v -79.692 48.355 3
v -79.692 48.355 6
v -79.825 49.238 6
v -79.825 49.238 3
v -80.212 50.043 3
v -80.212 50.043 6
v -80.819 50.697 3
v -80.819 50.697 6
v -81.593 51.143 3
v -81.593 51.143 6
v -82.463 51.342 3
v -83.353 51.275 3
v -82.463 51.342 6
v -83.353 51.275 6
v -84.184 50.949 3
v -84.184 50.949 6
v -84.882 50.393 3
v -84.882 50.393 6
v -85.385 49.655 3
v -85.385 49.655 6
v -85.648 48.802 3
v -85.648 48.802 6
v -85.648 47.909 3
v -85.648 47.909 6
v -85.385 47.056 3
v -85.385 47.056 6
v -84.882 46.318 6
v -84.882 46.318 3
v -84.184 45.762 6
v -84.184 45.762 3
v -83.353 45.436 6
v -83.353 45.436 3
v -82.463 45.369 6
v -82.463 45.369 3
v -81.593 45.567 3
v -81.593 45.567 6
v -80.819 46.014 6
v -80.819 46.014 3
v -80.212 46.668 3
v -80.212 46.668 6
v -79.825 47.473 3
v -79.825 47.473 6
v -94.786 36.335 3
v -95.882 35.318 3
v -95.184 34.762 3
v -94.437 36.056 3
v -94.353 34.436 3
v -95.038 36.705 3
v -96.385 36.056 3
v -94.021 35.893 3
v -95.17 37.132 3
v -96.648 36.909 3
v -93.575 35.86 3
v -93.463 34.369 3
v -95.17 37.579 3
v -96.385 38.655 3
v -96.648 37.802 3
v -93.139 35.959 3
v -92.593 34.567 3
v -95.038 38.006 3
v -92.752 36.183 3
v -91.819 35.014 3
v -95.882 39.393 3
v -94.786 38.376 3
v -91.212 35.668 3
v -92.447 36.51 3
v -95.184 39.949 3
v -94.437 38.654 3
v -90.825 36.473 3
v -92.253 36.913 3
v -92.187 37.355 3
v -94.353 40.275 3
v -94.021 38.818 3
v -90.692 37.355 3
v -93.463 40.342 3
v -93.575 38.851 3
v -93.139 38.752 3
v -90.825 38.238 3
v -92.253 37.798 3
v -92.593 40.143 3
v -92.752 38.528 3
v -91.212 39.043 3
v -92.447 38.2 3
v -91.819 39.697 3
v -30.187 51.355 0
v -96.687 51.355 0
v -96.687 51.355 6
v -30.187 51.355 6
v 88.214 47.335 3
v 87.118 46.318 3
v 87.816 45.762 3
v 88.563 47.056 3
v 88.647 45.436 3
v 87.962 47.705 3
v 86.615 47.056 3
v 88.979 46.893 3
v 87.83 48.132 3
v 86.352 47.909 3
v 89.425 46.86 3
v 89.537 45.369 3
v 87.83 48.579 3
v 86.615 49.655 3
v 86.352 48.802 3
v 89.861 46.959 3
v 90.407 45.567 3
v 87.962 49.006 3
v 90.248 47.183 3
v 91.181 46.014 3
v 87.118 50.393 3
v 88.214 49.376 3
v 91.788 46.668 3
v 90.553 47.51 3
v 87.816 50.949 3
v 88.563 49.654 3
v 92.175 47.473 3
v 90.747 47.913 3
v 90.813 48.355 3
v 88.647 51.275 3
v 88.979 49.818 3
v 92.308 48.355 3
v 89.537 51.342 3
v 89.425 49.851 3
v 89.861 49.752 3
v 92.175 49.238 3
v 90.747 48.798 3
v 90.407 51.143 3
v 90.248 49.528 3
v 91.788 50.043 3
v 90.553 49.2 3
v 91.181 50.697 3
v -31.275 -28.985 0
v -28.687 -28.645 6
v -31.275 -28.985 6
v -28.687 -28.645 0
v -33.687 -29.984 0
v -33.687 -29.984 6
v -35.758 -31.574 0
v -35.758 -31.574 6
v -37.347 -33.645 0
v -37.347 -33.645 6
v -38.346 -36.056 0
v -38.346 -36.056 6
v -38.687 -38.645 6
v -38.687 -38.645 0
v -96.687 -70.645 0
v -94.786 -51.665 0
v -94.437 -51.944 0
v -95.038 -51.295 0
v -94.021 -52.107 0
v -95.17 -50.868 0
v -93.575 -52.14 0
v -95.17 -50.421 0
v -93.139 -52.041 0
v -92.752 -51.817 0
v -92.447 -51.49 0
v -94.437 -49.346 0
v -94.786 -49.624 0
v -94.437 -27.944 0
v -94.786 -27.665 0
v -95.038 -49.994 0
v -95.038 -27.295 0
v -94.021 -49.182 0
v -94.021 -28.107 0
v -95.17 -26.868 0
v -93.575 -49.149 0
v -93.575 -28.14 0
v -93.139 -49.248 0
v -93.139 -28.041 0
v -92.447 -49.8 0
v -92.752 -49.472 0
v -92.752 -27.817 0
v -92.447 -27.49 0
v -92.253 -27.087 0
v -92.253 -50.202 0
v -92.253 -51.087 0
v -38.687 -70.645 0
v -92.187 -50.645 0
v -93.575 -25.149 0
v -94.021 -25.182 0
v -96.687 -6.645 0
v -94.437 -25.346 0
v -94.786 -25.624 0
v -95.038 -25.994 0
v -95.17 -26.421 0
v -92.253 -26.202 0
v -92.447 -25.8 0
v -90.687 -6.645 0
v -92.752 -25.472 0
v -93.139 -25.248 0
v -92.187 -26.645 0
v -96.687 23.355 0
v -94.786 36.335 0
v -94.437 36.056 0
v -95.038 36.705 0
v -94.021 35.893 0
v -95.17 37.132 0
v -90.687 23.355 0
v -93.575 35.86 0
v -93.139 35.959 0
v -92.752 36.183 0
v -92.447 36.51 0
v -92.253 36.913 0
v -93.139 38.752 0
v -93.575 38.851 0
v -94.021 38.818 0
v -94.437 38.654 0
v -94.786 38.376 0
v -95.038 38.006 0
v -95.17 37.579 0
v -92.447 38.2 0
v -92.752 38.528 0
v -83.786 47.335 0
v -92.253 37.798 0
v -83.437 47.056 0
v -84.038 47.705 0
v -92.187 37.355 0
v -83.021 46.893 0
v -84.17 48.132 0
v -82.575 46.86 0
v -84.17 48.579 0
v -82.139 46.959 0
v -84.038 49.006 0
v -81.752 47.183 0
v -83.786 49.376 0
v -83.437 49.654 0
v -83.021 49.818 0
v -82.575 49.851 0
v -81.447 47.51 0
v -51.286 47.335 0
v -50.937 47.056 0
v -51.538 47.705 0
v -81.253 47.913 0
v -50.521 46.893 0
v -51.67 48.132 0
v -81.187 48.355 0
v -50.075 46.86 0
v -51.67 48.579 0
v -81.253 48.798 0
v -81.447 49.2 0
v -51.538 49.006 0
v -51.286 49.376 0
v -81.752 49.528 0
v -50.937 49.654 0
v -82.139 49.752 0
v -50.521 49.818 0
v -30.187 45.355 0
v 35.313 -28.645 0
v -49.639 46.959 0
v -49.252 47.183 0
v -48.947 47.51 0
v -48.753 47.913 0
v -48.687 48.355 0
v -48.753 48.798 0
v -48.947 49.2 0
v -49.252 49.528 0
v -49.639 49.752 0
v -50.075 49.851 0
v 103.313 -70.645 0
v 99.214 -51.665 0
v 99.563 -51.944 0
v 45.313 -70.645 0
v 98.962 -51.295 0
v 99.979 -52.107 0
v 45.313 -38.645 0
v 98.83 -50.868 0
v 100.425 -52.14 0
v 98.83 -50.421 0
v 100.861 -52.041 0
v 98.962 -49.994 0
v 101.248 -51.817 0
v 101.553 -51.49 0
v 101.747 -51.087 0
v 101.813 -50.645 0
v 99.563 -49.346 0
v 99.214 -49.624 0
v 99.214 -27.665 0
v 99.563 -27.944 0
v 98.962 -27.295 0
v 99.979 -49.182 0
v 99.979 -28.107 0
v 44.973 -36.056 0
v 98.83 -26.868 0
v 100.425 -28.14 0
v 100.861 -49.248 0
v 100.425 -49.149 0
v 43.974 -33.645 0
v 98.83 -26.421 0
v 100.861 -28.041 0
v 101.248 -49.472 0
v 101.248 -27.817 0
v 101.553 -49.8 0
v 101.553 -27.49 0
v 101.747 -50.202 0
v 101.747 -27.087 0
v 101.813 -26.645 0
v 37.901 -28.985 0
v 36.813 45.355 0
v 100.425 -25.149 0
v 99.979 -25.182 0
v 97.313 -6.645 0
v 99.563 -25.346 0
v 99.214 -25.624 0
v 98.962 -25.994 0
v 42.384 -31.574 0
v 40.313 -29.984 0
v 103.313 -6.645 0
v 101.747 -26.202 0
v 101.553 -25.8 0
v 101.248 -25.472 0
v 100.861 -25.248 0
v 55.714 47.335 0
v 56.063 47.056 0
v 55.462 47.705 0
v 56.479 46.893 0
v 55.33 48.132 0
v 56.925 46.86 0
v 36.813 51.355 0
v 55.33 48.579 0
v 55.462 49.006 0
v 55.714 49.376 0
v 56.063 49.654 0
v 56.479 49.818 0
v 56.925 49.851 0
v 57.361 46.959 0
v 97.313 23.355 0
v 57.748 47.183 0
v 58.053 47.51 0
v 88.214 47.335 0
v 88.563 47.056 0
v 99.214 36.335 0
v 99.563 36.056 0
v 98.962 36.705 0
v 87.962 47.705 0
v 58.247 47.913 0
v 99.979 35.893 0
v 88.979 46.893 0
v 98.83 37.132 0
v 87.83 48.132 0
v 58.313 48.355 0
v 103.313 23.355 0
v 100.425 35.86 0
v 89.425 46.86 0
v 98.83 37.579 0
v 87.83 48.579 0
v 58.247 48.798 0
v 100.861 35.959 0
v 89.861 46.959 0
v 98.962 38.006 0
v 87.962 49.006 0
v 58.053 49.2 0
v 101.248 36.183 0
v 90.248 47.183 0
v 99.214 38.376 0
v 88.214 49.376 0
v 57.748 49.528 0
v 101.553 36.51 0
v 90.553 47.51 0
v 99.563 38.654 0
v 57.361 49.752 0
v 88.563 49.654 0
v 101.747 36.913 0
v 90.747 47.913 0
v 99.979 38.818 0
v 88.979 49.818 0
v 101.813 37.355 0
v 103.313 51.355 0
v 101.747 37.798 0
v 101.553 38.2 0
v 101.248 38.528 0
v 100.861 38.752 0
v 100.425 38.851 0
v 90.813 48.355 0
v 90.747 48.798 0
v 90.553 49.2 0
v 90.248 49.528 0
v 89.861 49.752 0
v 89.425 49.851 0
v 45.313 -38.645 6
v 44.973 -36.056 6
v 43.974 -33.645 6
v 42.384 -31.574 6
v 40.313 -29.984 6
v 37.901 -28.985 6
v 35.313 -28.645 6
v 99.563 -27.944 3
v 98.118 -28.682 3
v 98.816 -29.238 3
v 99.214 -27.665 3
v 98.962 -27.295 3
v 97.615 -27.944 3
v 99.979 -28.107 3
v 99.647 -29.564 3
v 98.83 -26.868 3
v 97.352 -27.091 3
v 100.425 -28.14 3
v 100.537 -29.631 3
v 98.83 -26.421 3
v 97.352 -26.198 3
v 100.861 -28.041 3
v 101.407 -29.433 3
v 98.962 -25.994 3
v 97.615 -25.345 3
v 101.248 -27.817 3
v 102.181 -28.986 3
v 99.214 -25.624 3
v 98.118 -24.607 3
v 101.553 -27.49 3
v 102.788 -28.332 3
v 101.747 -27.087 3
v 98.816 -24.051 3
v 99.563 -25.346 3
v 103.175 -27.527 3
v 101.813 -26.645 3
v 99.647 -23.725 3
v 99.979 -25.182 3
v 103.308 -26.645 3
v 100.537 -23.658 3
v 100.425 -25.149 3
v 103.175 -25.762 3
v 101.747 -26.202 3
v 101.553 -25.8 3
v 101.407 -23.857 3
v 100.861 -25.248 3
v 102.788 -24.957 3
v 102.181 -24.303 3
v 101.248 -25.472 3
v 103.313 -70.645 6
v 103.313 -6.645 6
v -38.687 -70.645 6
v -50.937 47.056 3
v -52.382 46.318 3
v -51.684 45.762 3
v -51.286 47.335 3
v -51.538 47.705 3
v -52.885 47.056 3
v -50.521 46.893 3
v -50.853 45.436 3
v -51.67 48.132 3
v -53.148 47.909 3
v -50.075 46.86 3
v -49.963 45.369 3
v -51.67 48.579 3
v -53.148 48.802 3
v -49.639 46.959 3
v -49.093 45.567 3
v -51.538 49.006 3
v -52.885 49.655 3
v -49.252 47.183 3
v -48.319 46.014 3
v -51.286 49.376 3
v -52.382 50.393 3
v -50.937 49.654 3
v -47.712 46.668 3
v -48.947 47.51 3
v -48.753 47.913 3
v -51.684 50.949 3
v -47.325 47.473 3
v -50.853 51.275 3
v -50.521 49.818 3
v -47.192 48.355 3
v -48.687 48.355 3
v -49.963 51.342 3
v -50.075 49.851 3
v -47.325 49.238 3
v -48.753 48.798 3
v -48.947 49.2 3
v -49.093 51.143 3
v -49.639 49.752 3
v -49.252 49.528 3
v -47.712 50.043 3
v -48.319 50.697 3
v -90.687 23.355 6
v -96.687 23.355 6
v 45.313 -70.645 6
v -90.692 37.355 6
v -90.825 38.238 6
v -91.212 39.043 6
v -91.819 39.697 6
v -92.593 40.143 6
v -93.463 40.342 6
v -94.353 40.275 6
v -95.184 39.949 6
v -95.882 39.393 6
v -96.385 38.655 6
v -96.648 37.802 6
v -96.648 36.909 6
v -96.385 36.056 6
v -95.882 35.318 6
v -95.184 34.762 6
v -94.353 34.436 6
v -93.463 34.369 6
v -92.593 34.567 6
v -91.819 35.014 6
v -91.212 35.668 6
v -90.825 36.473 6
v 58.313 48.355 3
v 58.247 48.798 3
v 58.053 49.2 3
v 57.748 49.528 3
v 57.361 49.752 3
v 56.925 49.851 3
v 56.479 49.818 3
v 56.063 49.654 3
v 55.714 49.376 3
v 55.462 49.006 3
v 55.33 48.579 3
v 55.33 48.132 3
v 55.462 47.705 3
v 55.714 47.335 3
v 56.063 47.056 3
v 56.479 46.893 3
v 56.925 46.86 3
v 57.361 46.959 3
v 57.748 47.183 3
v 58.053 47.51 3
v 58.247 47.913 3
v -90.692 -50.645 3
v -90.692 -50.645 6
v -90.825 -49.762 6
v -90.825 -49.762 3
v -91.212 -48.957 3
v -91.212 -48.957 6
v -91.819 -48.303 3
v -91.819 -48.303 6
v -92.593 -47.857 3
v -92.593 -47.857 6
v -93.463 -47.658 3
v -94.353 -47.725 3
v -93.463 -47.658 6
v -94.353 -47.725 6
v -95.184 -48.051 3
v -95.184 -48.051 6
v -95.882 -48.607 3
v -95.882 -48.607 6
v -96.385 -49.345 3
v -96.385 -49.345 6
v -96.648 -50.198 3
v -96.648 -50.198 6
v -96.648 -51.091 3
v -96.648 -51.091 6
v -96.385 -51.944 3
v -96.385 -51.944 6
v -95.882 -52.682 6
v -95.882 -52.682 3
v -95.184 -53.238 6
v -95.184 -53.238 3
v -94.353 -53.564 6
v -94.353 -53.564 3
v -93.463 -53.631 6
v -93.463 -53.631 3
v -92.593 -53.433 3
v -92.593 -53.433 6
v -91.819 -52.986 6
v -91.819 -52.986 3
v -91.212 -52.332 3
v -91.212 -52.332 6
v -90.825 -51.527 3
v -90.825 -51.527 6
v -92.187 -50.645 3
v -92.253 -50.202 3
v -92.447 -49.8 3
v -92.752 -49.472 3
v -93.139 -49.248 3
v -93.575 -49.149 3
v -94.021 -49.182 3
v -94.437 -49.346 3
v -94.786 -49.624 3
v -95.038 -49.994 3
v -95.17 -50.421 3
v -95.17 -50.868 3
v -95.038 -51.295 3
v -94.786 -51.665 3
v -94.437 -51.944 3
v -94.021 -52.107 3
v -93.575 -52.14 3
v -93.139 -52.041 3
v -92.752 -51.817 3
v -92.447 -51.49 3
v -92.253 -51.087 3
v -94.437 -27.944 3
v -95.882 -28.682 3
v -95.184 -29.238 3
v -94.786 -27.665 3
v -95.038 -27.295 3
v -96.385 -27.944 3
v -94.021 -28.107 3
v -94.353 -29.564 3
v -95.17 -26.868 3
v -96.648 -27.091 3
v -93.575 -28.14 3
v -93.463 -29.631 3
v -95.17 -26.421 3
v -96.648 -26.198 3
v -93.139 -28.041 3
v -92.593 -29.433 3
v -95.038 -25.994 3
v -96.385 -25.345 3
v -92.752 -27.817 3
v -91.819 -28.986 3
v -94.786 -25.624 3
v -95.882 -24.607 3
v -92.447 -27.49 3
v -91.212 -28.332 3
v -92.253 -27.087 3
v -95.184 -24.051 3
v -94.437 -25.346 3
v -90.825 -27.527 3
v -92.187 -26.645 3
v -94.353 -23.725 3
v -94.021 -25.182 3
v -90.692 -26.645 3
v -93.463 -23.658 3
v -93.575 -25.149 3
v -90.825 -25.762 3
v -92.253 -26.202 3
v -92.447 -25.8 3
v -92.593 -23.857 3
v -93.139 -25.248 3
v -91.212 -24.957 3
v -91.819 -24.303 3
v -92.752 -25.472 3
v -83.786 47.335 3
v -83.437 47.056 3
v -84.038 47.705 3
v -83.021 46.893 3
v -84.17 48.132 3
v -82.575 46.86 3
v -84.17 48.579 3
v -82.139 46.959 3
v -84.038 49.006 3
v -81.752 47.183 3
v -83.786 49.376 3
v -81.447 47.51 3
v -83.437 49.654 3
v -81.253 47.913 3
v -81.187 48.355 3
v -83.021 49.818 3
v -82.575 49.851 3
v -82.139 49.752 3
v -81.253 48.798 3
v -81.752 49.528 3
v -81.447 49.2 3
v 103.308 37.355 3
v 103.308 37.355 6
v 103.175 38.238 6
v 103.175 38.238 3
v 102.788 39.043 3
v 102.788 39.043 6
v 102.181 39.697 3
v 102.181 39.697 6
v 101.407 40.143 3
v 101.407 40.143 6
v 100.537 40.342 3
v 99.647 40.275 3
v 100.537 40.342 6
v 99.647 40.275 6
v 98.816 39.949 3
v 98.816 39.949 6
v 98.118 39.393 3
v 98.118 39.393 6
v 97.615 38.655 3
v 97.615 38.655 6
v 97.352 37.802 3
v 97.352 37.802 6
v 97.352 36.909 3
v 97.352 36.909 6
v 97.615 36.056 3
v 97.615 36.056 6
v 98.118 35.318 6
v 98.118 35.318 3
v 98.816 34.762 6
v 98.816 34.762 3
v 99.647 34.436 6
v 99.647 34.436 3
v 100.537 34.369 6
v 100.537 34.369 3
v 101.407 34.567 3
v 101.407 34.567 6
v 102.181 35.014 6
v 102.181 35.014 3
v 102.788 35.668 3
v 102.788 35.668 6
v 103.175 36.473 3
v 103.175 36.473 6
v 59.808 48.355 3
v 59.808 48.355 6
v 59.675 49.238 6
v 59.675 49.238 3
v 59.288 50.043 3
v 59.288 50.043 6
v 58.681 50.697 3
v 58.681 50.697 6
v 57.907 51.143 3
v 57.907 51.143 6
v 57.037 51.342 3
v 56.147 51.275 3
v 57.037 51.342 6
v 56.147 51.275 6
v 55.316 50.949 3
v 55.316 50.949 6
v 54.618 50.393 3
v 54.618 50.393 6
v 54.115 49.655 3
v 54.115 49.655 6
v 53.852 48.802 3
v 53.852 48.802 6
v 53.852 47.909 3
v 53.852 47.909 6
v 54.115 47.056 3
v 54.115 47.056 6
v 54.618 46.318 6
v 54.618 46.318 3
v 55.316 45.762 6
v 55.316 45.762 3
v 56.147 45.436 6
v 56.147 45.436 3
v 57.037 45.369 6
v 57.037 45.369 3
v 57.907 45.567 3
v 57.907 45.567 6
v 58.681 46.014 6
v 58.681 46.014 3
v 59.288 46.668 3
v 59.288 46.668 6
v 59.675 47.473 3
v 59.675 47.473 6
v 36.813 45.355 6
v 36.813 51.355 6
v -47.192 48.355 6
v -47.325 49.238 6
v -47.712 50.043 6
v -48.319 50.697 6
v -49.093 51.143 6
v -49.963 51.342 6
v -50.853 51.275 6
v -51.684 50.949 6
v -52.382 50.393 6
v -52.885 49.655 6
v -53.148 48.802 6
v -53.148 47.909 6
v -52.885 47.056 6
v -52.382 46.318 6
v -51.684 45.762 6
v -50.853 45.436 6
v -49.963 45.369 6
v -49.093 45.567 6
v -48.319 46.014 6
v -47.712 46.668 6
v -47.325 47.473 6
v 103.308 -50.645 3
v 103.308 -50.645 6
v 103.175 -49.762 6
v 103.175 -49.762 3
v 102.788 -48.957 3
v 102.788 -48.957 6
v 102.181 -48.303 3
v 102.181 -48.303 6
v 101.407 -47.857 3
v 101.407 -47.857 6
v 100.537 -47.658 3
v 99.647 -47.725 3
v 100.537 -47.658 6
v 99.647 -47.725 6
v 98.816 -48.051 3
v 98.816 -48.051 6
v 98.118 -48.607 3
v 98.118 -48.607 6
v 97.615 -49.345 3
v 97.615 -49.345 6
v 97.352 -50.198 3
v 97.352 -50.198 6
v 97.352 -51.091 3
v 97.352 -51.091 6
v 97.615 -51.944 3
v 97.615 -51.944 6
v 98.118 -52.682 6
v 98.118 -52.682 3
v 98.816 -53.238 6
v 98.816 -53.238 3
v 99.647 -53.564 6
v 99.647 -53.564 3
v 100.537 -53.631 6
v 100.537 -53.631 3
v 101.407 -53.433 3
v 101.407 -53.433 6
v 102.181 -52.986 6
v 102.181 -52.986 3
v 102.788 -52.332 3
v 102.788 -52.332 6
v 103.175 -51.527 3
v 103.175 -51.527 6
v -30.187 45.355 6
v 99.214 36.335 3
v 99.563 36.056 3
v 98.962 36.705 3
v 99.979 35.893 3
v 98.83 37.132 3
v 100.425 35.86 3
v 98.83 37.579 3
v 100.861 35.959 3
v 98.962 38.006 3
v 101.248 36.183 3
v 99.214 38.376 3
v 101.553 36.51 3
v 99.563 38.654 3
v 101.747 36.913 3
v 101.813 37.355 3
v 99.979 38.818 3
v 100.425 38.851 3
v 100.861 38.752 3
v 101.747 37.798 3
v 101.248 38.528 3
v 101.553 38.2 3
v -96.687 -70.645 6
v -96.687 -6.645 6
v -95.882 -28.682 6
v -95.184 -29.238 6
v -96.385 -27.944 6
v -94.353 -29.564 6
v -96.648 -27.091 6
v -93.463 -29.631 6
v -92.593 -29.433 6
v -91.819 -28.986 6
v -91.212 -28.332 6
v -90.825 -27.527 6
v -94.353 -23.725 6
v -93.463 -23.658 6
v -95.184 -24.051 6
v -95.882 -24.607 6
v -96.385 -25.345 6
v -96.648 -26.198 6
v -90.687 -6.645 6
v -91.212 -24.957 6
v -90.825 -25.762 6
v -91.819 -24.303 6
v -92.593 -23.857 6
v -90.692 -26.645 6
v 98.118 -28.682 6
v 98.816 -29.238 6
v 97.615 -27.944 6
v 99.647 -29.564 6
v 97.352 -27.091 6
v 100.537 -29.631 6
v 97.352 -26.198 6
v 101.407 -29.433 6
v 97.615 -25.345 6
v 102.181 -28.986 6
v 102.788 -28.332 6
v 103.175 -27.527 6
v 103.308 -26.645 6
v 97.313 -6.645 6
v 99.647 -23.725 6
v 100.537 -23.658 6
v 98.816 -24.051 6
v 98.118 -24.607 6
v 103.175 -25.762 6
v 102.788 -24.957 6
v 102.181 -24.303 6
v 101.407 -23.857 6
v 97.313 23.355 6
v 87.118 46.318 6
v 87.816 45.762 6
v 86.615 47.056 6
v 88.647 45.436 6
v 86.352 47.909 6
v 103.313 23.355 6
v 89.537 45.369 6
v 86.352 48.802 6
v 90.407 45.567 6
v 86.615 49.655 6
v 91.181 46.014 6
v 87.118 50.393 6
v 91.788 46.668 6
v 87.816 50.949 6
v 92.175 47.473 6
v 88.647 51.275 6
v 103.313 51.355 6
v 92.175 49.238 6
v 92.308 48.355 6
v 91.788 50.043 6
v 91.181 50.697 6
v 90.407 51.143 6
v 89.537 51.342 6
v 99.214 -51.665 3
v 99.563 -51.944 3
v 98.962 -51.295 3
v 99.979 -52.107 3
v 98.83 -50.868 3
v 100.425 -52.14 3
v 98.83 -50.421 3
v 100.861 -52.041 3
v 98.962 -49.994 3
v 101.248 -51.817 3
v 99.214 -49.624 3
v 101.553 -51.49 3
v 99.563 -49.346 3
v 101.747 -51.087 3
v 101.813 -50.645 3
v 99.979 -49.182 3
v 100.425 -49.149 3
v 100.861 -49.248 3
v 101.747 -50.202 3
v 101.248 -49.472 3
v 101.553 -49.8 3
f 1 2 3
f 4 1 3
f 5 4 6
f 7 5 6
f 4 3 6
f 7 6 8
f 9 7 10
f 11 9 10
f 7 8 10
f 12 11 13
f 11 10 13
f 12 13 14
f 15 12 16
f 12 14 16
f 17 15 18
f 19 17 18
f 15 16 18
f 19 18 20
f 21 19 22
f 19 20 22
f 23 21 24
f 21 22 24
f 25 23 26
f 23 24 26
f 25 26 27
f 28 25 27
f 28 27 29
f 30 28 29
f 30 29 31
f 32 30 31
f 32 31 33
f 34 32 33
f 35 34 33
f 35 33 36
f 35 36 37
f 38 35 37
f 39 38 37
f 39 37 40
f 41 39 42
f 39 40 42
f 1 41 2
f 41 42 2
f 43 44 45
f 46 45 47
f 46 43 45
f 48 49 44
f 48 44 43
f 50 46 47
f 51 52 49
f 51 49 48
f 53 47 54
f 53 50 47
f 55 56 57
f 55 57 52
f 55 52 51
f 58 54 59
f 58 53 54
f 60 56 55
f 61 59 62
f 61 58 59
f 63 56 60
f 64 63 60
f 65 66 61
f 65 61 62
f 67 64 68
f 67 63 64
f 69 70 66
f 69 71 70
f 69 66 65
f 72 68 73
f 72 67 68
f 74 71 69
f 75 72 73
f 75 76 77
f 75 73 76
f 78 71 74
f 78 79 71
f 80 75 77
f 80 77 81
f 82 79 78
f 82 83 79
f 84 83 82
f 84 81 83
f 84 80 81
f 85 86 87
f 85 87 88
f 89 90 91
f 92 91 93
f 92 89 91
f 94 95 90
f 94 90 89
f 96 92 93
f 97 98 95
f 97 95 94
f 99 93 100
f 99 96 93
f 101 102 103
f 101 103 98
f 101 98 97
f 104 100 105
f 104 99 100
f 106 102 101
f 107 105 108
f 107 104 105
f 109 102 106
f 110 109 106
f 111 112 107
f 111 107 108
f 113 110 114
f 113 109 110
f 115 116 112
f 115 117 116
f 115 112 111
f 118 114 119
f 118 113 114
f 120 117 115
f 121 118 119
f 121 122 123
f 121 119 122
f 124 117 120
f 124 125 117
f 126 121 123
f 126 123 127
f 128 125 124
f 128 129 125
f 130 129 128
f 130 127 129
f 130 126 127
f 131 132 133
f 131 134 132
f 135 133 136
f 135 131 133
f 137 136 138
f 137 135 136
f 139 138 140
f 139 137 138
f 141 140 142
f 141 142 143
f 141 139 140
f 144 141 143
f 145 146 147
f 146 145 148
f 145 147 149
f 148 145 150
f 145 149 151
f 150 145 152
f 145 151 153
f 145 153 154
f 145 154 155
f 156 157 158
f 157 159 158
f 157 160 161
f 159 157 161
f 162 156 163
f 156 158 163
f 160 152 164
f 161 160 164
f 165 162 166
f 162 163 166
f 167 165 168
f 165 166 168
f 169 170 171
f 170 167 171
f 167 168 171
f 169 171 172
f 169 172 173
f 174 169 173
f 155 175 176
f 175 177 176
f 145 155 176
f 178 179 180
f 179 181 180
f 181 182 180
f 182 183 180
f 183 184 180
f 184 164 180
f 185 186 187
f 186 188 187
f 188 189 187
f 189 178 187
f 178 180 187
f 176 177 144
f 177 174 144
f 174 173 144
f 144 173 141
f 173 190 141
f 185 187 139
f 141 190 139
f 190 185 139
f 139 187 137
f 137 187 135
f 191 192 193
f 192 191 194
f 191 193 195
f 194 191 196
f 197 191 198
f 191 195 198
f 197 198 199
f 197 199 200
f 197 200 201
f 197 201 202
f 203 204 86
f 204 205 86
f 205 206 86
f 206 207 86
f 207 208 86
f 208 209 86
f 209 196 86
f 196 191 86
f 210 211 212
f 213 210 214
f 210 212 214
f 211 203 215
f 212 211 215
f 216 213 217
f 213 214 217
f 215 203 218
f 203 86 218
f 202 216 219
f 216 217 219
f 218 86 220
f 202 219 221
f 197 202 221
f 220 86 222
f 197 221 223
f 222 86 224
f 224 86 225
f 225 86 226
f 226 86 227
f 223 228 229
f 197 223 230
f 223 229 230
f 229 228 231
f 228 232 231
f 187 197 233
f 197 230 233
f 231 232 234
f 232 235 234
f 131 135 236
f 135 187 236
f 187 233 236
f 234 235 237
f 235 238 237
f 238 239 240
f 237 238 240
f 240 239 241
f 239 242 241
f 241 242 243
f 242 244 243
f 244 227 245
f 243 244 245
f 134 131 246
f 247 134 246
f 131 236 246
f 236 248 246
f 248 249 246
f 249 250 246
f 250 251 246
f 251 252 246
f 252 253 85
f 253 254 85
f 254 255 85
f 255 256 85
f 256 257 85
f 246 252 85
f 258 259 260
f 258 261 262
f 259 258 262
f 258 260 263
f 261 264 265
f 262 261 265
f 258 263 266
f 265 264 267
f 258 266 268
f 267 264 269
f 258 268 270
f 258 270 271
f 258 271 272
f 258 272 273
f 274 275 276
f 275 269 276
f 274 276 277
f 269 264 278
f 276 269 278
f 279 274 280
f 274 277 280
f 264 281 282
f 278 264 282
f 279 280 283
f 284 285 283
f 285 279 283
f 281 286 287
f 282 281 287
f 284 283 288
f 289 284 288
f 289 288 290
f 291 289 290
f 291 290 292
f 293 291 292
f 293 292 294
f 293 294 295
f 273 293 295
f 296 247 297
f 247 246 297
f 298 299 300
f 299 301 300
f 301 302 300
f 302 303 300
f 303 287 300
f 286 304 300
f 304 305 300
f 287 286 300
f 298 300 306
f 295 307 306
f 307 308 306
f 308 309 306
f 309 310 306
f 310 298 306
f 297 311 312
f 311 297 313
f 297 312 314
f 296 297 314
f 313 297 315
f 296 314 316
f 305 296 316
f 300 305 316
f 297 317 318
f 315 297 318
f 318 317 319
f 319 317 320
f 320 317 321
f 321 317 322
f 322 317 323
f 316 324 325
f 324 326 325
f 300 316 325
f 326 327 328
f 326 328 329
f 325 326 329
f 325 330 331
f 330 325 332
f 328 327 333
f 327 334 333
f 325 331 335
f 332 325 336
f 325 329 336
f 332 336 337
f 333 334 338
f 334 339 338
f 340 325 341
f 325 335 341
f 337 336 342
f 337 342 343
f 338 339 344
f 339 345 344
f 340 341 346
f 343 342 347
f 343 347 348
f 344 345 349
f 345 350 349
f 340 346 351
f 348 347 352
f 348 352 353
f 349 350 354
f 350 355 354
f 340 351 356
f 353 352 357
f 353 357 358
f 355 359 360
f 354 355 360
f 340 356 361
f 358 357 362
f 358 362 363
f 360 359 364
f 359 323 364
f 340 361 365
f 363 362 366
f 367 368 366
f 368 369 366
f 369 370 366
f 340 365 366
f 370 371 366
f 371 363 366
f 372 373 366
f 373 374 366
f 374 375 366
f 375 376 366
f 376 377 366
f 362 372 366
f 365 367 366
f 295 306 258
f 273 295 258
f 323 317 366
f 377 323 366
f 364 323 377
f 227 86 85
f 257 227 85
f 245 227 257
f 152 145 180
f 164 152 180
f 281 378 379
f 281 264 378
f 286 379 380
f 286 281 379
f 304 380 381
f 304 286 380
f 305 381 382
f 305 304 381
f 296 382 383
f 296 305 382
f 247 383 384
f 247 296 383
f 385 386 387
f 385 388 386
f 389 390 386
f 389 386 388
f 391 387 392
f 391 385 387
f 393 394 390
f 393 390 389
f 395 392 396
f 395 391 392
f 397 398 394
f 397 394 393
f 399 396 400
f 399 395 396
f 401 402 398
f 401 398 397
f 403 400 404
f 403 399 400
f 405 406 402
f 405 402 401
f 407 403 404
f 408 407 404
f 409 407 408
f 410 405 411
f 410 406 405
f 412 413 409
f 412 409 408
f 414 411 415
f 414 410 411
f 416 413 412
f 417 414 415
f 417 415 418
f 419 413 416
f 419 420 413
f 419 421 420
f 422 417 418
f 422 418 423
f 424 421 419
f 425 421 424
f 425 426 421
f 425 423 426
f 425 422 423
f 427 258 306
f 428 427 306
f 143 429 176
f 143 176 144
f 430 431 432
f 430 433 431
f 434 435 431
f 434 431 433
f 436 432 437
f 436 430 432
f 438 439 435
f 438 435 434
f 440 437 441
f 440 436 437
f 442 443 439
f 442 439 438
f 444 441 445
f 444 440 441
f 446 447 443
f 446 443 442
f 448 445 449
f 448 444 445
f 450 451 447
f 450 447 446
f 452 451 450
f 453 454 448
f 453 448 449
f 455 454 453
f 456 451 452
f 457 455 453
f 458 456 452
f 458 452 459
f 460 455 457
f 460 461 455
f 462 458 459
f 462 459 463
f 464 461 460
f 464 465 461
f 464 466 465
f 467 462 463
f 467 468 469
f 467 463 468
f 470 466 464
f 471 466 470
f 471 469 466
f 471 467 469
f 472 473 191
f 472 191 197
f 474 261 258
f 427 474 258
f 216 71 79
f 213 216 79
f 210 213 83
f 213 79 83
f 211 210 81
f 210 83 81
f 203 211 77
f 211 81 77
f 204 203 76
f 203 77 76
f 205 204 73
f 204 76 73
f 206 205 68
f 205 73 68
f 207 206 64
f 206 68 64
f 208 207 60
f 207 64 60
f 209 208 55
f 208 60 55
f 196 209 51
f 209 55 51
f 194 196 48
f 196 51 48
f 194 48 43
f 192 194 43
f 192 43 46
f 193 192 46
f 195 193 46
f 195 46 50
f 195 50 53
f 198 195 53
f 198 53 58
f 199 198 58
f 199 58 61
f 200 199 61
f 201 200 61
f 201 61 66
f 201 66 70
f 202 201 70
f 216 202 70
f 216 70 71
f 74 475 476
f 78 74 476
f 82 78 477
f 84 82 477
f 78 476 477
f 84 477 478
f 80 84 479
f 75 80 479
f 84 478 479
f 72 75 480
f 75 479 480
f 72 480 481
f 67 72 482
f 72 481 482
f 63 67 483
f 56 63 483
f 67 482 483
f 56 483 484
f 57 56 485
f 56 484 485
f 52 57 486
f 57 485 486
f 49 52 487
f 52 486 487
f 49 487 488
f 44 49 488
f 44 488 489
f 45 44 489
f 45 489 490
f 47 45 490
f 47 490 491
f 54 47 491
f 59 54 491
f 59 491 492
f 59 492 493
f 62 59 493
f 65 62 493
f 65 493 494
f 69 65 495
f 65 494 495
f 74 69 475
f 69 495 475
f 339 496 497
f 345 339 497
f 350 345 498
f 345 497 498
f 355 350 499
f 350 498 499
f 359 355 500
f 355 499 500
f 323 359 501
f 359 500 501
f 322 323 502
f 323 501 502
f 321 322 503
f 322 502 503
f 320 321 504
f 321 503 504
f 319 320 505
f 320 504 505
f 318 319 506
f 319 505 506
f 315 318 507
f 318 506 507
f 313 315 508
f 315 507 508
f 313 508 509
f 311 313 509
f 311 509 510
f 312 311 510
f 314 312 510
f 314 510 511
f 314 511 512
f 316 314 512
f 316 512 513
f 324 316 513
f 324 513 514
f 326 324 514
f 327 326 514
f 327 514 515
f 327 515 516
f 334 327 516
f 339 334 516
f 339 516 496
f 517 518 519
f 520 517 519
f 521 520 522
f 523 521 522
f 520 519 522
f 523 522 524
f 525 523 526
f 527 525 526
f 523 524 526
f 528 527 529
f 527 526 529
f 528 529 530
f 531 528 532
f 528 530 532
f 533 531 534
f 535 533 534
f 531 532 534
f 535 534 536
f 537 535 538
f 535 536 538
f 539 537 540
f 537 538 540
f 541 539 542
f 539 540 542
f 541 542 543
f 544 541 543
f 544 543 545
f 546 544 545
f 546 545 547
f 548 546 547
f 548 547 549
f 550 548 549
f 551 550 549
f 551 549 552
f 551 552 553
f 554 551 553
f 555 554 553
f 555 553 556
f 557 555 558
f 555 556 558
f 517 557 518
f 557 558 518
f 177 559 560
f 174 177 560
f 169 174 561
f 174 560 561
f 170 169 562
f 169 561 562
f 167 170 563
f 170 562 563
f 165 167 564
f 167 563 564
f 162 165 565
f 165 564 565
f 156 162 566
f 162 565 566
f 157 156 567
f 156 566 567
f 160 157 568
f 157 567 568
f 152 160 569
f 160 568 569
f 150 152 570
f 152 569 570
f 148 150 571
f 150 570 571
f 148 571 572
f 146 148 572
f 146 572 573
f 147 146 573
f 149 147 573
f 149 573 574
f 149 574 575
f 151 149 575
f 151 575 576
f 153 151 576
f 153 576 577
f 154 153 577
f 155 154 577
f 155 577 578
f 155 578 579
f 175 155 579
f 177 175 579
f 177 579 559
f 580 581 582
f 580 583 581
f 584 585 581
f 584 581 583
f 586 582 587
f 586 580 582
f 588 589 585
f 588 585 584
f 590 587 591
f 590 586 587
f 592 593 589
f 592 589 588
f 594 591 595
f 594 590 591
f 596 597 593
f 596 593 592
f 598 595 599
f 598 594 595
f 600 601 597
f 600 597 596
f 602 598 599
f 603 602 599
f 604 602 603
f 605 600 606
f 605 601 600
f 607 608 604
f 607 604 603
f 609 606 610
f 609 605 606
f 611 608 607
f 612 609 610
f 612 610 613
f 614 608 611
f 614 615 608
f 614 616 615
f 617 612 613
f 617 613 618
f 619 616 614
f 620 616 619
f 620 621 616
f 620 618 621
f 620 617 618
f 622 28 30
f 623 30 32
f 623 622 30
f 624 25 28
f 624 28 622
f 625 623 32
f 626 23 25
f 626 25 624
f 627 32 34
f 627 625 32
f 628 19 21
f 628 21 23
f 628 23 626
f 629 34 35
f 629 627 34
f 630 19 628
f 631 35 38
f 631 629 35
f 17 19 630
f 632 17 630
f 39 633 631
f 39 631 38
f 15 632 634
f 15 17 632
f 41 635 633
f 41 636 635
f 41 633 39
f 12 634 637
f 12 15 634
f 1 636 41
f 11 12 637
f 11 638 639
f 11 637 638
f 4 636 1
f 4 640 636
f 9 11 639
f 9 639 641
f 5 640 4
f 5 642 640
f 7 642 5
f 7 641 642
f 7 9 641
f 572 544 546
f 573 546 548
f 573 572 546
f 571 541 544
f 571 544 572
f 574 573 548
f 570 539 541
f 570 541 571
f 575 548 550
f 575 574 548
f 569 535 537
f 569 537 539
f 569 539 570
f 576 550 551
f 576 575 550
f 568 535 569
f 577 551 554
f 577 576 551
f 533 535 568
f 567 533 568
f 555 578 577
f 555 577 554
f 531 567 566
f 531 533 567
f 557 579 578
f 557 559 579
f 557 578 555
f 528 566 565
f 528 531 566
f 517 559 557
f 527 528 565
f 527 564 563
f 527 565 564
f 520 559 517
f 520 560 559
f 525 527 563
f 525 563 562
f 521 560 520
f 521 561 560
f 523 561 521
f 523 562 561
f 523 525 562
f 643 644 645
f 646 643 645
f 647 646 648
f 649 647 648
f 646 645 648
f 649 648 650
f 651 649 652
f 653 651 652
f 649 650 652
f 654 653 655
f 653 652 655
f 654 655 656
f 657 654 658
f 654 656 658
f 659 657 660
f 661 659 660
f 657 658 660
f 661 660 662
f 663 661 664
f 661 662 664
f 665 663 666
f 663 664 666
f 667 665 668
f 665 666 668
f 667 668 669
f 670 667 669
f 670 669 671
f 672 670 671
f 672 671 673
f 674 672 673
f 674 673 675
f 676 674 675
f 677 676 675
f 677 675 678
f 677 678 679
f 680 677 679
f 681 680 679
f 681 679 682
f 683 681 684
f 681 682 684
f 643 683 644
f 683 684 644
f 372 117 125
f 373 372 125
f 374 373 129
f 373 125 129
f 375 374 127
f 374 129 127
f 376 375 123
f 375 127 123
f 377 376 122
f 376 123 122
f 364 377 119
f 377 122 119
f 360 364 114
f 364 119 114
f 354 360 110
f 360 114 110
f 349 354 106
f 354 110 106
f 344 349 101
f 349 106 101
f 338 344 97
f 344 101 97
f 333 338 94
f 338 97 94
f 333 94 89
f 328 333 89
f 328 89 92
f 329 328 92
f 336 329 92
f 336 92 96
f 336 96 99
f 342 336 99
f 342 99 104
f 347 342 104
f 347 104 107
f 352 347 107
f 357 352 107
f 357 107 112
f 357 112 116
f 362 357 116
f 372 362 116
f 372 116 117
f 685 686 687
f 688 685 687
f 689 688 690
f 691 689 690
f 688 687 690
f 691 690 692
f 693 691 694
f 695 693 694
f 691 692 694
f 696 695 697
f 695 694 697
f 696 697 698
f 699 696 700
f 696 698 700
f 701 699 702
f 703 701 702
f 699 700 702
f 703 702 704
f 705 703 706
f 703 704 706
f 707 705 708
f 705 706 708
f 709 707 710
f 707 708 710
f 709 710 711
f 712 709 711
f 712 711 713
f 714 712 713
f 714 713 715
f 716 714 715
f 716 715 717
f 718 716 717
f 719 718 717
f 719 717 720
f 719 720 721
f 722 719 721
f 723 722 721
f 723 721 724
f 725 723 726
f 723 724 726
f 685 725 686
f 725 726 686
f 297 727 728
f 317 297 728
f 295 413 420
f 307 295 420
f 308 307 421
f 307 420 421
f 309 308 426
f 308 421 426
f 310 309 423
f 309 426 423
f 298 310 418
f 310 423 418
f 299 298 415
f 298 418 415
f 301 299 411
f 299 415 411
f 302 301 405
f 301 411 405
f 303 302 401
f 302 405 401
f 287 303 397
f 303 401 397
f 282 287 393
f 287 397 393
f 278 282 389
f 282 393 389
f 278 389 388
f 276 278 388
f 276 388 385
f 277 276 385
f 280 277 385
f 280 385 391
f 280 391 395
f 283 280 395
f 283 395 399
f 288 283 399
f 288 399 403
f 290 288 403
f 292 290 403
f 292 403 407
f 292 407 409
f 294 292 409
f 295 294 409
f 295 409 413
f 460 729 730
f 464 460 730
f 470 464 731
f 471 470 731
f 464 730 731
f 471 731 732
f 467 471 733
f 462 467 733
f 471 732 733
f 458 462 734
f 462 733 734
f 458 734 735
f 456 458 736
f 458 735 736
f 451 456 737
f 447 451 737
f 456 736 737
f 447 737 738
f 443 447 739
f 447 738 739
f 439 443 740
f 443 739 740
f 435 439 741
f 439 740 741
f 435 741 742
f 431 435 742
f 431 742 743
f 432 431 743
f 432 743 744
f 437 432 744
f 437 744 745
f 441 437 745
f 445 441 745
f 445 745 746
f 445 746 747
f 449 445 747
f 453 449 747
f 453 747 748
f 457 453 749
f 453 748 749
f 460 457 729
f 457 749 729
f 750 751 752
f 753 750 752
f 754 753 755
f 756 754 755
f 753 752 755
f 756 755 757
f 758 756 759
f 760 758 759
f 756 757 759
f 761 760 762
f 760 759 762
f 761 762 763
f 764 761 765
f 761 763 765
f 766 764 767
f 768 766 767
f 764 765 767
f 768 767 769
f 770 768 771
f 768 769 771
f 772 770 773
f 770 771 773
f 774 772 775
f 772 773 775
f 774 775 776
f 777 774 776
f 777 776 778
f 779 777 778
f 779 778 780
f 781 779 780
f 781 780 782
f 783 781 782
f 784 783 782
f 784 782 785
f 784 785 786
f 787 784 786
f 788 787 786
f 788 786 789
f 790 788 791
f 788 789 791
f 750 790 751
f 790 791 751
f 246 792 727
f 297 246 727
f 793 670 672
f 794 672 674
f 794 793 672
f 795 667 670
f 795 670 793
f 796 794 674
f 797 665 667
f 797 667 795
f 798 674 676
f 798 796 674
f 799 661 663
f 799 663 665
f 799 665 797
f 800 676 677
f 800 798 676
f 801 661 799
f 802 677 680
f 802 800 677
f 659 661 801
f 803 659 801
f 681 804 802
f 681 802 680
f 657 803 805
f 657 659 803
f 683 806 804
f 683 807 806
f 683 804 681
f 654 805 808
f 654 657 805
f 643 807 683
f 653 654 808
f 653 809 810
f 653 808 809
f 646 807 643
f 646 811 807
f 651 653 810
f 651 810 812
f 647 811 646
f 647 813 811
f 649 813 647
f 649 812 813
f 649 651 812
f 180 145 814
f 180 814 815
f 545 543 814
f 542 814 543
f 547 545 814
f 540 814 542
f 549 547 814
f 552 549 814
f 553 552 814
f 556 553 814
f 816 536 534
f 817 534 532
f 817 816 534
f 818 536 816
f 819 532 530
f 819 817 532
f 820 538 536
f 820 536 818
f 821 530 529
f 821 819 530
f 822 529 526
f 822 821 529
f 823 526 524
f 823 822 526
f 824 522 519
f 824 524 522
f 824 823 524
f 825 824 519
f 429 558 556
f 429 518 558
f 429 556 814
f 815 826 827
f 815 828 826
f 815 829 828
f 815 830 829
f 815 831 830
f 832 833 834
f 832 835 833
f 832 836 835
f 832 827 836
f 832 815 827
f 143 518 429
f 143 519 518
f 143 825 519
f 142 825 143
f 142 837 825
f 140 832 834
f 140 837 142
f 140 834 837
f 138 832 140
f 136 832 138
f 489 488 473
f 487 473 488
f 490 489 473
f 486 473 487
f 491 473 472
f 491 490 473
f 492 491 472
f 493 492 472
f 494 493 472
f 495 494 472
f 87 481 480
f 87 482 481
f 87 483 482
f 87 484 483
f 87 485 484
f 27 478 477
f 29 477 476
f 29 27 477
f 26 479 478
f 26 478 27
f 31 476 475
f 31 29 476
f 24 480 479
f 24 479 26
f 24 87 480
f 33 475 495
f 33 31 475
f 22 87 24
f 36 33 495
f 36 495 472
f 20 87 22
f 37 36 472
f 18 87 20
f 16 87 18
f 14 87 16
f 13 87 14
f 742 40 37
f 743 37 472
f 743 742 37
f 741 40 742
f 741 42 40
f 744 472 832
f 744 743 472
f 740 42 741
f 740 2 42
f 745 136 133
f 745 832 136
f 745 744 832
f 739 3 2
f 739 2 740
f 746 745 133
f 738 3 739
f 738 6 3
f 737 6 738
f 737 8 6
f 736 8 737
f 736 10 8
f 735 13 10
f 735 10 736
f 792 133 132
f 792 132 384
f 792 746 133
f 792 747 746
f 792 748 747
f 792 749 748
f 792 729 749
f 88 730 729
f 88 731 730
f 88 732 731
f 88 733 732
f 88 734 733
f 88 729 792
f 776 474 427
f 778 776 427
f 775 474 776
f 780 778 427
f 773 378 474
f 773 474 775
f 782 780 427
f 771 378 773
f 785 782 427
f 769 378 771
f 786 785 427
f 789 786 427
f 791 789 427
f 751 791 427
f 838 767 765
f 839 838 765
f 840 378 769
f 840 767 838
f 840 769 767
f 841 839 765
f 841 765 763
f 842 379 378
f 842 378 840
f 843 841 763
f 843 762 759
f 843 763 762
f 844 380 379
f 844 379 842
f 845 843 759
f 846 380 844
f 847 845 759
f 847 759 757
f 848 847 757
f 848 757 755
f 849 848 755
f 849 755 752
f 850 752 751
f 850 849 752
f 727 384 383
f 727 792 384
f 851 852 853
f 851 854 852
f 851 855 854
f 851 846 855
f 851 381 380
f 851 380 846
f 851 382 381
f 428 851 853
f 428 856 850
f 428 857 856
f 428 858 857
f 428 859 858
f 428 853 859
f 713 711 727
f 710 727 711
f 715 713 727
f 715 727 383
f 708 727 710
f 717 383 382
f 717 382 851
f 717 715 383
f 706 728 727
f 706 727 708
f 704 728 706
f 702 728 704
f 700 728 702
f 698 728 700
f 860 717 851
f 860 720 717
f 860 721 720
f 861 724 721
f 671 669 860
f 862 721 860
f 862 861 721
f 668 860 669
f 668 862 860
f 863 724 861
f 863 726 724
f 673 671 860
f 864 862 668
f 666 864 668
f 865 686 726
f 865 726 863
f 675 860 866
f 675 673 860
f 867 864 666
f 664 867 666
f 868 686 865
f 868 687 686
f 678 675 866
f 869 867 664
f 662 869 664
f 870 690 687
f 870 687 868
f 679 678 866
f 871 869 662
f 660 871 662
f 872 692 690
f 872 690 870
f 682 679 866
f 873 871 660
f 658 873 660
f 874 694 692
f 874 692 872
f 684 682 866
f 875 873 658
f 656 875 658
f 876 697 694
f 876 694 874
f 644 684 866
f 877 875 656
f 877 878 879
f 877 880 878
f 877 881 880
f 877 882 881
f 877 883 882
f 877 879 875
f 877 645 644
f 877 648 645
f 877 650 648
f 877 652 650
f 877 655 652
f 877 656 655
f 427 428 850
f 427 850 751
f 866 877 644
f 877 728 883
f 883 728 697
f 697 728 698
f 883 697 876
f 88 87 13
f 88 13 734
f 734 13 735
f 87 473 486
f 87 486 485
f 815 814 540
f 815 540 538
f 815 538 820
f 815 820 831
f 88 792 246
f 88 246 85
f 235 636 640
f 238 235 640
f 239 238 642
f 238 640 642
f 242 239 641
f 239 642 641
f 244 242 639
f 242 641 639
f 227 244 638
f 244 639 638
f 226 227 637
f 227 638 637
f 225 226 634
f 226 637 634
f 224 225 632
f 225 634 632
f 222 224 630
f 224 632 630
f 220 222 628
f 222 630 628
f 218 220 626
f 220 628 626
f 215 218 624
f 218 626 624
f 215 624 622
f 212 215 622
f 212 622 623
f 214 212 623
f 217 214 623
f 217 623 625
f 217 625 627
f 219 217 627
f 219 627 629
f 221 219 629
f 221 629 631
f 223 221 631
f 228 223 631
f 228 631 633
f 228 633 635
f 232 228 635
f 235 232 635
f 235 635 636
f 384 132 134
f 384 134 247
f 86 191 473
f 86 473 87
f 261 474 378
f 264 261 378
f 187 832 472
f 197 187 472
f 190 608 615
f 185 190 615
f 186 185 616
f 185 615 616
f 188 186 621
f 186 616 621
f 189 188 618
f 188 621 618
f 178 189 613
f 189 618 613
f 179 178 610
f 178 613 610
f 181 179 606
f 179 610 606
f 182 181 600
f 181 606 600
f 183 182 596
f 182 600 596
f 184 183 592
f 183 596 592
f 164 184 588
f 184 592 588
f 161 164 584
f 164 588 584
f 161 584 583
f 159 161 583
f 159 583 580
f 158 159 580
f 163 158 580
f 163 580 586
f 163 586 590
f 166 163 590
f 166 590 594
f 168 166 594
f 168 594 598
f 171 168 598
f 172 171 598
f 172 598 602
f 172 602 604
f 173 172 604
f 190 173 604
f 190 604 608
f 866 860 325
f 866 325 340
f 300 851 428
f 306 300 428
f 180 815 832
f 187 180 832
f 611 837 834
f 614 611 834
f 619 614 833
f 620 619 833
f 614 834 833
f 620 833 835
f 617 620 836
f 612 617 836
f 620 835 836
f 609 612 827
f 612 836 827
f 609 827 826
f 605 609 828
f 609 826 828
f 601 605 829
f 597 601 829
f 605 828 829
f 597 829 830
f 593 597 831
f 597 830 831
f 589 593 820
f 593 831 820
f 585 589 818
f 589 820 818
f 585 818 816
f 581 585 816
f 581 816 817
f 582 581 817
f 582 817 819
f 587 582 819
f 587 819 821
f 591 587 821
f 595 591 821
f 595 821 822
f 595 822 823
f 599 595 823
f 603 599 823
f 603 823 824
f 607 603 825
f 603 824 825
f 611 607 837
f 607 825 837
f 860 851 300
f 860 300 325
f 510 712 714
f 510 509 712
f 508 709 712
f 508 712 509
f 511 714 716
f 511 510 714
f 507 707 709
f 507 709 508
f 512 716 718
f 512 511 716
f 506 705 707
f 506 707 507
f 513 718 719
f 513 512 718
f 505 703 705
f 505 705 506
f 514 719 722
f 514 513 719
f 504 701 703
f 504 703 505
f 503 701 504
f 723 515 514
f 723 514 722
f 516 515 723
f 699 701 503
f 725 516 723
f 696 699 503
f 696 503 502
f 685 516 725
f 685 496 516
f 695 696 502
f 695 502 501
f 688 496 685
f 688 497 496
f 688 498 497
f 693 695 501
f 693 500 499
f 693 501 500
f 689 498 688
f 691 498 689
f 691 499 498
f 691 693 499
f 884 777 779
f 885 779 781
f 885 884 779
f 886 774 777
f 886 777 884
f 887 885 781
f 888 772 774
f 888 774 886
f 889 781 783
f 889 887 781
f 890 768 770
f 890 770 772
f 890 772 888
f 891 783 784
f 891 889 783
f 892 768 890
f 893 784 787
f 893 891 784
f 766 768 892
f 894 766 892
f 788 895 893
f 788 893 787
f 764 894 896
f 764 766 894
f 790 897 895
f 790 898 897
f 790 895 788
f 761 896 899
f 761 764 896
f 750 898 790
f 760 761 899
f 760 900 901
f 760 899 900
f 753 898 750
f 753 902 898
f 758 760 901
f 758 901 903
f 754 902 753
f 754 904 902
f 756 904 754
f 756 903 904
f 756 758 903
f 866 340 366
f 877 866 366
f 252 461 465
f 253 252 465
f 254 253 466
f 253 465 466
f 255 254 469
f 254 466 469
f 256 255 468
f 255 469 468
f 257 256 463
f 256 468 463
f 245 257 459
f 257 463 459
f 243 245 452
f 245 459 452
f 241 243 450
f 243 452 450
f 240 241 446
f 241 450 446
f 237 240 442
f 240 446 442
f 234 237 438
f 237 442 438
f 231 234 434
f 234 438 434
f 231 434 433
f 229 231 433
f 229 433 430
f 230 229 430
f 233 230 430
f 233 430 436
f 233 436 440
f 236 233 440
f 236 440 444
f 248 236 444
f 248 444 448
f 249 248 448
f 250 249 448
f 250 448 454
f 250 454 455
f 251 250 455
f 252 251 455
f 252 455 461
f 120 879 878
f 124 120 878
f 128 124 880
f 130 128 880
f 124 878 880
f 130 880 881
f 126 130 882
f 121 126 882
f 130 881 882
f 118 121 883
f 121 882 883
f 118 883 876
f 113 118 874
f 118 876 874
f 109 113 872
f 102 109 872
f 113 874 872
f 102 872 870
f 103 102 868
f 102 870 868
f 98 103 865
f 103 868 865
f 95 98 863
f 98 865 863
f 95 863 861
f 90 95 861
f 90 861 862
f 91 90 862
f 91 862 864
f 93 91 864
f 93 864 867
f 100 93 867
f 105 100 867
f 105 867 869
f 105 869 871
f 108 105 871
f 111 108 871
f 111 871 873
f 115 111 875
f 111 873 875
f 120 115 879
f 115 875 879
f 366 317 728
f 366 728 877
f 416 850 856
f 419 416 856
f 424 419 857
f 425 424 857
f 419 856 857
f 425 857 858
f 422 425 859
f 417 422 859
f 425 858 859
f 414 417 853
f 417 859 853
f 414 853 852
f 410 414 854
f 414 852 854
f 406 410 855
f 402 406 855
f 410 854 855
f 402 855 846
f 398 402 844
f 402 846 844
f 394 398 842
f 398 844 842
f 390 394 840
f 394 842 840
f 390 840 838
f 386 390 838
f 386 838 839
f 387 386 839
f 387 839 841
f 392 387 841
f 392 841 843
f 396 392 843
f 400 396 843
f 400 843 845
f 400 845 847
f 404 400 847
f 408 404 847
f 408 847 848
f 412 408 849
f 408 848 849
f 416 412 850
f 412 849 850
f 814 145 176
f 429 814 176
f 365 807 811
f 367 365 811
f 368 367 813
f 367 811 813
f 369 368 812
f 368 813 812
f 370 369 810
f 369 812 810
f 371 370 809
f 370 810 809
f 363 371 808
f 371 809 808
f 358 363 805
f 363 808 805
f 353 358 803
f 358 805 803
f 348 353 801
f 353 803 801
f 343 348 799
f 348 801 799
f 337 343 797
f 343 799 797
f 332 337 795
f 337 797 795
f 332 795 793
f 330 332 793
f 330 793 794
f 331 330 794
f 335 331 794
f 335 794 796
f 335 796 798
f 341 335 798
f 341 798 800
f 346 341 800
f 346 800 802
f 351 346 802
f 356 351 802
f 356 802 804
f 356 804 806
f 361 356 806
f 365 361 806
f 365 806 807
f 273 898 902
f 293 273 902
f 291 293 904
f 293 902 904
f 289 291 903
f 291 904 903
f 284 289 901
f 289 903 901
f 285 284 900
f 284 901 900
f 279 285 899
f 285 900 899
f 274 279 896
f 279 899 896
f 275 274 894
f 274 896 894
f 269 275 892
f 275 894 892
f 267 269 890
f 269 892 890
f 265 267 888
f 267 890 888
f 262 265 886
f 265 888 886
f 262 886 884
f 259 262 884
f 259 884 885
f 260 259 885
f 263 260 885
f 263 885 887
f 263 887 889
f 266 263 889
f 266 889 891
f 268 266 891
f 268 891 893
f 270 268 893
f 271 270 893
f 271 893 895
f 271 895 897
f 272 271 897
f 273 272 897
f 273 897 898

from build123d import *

# Parameters (mm, degrees)
ESQUISSE1_W             = 200
ESQUISSE1_H             = 122
BOSS_EXTRU_1_DEPTH      = 6
ESQUISSE2_W             = 67
ESQUISSE2_H             = 6
ESQUISSE2_W_2           = 6
ESQUISSE2_H_2           = 30
ESQUISSE2_W_3           = 84
ESQUISSE2_H_3           = 42
ENL_V_MAT_EXTRU_1_DEPTH = 6
CONG_1_R                = 10
ESQUISSE3_R             = 1.5
ENL_V_MAT_EXTRU_2_DEPTH = 6
ESQUISSE4_R             = 2.995
ENL_V_MAT_EXTRU_3_DEPTH = 3


with BuildPart() as part:
    # Esquisse1 → Boss.-Extru.1 (new body)
    with BuildSketch(Plane.XY):
        with Locations((3.313253012, -9.644578313)):
            Rectangle(ESQUISSE1_W, ESQUISSE1_H)
    extrude(amount=BOSS_EXTRU_1_DEPTH)

    # Esquisse2 → Enlèv. mat.-Extru.1 (cut)
    with BuildSketch(Plane.XY.offset(6)):
        with Locations((3.313253012, 48.355421687)):
            Rectangle(ESQUISSE2_W, ESQUISSE2_H)
        with Locations((-93.686746988, 8.355421687)):
            Rectangle(ESQUISSE2_W_2, ESQUISSE2_H_2)
        with Locations((100.313253012, 8.355421687)):
            Rectangle(ESQUISSE2_W_2, ESQUISSE2_H_2)
        with Locations((3.313253012, -49.644578313)):
            Rectangle(ESQUISSE2_W_3, ESQUISSE2_H_3)
    extrude(amount=-ENL_V_MAT_EXTRU_1_DEPTH, mode=Mode.SUBTRACT)

    # Congé1
    cong_1_edges = [part.edges().sort_by_distance(p)[0] for p in [
        (-38.686746988, -28.644578313, 3),
        (45.313253012, -28.644578313, 3),
    ]]
    fillet(cong_1_edges, radius=CONG_1_R)

    # Esquisse3 → Enlèv. mat.-Extru.2 (cut)
    with BuildSketch(Plane.XY.offset(6)):
        with Locations((-93.686746988, -50.644578313)):
            Circle(ESQUISSE3_R)
        with Locations((-93.686746988, -26.644578313)):
            Circle(ESQUISSE3_R)
        with Locations((-93.686746988, 37.355421687)):
            Circle(ESQUISSE3_R)
        with Locations((-50.186746988, 48.355421687)):
            Circle(ESQUISSE3_R)
        with Locations((56.813253012, 48.355421687)):
            Circle(ESQUISSE3_R)
        with Locations((100.313253012, 37.355421687)):
            Circle(ESQUISSE3_R)
        with Locations((100.313253012, -26.644578313)):
            Circle(ESQUISSE3_R)
        with Locations((100.313253012, -50.644578313)):
            Circle(ESQUISSE3_R)
        with Locations((-82.686746988, 48.355421687)):
            Circle(ESQUISSE3_R)
        with Locations((89.313253012, 48.355421687)):
            Circle(ESQUISSE3_R)
    extrude(amount=-ENL_V_MAT_EXTRU_2_DEPTH, mode=Mode.SUBTRACT)

    # Esquisse4 → Enlèv. mat.-Extru.3 (cut)
    with BuildSketch(Plane.XY.offset(6)):
        with Locations((-93.686746988, -50.644578313)):
            Circle(ESQUISSE4_R)
        with Locations((-93.686746988, -26.644578313)):
            Circle(ESQUISSE4_R)
        with Locations((-93.686746988, 37.355421687)):
            Circle(ESQUISSE4_R)
        with Locations((-82.686746988, 48.355421687)):
            Circle(ESQUISSE4_R)
        with Locations((-50.186746988, 48.355421687)):
            Circle(ESQUISSE4_R)
        with Locations((56.813253012, 48.355421687)):
            Circle(ESQUISSE4_R)
        with Locations((89.313253012, 48.355421687)):
            Circle(ESQUISSE4_R)
        with Locations((100.313253012, 37.355421687)):
            Circle(ESQUISSE4_R)
        with Locations((100.313253012, -26.644578313)):
            Circle(ESQUISSE4_R)
        with Locations((100.313253012, -50.644578313)):
            Circle(ESQUISSE4_R)
    extrude(amount=-ENL_V_MAT_EXTRU_3_DEPTH, mode=Mode.SUBTRACT)


solid = part.part
